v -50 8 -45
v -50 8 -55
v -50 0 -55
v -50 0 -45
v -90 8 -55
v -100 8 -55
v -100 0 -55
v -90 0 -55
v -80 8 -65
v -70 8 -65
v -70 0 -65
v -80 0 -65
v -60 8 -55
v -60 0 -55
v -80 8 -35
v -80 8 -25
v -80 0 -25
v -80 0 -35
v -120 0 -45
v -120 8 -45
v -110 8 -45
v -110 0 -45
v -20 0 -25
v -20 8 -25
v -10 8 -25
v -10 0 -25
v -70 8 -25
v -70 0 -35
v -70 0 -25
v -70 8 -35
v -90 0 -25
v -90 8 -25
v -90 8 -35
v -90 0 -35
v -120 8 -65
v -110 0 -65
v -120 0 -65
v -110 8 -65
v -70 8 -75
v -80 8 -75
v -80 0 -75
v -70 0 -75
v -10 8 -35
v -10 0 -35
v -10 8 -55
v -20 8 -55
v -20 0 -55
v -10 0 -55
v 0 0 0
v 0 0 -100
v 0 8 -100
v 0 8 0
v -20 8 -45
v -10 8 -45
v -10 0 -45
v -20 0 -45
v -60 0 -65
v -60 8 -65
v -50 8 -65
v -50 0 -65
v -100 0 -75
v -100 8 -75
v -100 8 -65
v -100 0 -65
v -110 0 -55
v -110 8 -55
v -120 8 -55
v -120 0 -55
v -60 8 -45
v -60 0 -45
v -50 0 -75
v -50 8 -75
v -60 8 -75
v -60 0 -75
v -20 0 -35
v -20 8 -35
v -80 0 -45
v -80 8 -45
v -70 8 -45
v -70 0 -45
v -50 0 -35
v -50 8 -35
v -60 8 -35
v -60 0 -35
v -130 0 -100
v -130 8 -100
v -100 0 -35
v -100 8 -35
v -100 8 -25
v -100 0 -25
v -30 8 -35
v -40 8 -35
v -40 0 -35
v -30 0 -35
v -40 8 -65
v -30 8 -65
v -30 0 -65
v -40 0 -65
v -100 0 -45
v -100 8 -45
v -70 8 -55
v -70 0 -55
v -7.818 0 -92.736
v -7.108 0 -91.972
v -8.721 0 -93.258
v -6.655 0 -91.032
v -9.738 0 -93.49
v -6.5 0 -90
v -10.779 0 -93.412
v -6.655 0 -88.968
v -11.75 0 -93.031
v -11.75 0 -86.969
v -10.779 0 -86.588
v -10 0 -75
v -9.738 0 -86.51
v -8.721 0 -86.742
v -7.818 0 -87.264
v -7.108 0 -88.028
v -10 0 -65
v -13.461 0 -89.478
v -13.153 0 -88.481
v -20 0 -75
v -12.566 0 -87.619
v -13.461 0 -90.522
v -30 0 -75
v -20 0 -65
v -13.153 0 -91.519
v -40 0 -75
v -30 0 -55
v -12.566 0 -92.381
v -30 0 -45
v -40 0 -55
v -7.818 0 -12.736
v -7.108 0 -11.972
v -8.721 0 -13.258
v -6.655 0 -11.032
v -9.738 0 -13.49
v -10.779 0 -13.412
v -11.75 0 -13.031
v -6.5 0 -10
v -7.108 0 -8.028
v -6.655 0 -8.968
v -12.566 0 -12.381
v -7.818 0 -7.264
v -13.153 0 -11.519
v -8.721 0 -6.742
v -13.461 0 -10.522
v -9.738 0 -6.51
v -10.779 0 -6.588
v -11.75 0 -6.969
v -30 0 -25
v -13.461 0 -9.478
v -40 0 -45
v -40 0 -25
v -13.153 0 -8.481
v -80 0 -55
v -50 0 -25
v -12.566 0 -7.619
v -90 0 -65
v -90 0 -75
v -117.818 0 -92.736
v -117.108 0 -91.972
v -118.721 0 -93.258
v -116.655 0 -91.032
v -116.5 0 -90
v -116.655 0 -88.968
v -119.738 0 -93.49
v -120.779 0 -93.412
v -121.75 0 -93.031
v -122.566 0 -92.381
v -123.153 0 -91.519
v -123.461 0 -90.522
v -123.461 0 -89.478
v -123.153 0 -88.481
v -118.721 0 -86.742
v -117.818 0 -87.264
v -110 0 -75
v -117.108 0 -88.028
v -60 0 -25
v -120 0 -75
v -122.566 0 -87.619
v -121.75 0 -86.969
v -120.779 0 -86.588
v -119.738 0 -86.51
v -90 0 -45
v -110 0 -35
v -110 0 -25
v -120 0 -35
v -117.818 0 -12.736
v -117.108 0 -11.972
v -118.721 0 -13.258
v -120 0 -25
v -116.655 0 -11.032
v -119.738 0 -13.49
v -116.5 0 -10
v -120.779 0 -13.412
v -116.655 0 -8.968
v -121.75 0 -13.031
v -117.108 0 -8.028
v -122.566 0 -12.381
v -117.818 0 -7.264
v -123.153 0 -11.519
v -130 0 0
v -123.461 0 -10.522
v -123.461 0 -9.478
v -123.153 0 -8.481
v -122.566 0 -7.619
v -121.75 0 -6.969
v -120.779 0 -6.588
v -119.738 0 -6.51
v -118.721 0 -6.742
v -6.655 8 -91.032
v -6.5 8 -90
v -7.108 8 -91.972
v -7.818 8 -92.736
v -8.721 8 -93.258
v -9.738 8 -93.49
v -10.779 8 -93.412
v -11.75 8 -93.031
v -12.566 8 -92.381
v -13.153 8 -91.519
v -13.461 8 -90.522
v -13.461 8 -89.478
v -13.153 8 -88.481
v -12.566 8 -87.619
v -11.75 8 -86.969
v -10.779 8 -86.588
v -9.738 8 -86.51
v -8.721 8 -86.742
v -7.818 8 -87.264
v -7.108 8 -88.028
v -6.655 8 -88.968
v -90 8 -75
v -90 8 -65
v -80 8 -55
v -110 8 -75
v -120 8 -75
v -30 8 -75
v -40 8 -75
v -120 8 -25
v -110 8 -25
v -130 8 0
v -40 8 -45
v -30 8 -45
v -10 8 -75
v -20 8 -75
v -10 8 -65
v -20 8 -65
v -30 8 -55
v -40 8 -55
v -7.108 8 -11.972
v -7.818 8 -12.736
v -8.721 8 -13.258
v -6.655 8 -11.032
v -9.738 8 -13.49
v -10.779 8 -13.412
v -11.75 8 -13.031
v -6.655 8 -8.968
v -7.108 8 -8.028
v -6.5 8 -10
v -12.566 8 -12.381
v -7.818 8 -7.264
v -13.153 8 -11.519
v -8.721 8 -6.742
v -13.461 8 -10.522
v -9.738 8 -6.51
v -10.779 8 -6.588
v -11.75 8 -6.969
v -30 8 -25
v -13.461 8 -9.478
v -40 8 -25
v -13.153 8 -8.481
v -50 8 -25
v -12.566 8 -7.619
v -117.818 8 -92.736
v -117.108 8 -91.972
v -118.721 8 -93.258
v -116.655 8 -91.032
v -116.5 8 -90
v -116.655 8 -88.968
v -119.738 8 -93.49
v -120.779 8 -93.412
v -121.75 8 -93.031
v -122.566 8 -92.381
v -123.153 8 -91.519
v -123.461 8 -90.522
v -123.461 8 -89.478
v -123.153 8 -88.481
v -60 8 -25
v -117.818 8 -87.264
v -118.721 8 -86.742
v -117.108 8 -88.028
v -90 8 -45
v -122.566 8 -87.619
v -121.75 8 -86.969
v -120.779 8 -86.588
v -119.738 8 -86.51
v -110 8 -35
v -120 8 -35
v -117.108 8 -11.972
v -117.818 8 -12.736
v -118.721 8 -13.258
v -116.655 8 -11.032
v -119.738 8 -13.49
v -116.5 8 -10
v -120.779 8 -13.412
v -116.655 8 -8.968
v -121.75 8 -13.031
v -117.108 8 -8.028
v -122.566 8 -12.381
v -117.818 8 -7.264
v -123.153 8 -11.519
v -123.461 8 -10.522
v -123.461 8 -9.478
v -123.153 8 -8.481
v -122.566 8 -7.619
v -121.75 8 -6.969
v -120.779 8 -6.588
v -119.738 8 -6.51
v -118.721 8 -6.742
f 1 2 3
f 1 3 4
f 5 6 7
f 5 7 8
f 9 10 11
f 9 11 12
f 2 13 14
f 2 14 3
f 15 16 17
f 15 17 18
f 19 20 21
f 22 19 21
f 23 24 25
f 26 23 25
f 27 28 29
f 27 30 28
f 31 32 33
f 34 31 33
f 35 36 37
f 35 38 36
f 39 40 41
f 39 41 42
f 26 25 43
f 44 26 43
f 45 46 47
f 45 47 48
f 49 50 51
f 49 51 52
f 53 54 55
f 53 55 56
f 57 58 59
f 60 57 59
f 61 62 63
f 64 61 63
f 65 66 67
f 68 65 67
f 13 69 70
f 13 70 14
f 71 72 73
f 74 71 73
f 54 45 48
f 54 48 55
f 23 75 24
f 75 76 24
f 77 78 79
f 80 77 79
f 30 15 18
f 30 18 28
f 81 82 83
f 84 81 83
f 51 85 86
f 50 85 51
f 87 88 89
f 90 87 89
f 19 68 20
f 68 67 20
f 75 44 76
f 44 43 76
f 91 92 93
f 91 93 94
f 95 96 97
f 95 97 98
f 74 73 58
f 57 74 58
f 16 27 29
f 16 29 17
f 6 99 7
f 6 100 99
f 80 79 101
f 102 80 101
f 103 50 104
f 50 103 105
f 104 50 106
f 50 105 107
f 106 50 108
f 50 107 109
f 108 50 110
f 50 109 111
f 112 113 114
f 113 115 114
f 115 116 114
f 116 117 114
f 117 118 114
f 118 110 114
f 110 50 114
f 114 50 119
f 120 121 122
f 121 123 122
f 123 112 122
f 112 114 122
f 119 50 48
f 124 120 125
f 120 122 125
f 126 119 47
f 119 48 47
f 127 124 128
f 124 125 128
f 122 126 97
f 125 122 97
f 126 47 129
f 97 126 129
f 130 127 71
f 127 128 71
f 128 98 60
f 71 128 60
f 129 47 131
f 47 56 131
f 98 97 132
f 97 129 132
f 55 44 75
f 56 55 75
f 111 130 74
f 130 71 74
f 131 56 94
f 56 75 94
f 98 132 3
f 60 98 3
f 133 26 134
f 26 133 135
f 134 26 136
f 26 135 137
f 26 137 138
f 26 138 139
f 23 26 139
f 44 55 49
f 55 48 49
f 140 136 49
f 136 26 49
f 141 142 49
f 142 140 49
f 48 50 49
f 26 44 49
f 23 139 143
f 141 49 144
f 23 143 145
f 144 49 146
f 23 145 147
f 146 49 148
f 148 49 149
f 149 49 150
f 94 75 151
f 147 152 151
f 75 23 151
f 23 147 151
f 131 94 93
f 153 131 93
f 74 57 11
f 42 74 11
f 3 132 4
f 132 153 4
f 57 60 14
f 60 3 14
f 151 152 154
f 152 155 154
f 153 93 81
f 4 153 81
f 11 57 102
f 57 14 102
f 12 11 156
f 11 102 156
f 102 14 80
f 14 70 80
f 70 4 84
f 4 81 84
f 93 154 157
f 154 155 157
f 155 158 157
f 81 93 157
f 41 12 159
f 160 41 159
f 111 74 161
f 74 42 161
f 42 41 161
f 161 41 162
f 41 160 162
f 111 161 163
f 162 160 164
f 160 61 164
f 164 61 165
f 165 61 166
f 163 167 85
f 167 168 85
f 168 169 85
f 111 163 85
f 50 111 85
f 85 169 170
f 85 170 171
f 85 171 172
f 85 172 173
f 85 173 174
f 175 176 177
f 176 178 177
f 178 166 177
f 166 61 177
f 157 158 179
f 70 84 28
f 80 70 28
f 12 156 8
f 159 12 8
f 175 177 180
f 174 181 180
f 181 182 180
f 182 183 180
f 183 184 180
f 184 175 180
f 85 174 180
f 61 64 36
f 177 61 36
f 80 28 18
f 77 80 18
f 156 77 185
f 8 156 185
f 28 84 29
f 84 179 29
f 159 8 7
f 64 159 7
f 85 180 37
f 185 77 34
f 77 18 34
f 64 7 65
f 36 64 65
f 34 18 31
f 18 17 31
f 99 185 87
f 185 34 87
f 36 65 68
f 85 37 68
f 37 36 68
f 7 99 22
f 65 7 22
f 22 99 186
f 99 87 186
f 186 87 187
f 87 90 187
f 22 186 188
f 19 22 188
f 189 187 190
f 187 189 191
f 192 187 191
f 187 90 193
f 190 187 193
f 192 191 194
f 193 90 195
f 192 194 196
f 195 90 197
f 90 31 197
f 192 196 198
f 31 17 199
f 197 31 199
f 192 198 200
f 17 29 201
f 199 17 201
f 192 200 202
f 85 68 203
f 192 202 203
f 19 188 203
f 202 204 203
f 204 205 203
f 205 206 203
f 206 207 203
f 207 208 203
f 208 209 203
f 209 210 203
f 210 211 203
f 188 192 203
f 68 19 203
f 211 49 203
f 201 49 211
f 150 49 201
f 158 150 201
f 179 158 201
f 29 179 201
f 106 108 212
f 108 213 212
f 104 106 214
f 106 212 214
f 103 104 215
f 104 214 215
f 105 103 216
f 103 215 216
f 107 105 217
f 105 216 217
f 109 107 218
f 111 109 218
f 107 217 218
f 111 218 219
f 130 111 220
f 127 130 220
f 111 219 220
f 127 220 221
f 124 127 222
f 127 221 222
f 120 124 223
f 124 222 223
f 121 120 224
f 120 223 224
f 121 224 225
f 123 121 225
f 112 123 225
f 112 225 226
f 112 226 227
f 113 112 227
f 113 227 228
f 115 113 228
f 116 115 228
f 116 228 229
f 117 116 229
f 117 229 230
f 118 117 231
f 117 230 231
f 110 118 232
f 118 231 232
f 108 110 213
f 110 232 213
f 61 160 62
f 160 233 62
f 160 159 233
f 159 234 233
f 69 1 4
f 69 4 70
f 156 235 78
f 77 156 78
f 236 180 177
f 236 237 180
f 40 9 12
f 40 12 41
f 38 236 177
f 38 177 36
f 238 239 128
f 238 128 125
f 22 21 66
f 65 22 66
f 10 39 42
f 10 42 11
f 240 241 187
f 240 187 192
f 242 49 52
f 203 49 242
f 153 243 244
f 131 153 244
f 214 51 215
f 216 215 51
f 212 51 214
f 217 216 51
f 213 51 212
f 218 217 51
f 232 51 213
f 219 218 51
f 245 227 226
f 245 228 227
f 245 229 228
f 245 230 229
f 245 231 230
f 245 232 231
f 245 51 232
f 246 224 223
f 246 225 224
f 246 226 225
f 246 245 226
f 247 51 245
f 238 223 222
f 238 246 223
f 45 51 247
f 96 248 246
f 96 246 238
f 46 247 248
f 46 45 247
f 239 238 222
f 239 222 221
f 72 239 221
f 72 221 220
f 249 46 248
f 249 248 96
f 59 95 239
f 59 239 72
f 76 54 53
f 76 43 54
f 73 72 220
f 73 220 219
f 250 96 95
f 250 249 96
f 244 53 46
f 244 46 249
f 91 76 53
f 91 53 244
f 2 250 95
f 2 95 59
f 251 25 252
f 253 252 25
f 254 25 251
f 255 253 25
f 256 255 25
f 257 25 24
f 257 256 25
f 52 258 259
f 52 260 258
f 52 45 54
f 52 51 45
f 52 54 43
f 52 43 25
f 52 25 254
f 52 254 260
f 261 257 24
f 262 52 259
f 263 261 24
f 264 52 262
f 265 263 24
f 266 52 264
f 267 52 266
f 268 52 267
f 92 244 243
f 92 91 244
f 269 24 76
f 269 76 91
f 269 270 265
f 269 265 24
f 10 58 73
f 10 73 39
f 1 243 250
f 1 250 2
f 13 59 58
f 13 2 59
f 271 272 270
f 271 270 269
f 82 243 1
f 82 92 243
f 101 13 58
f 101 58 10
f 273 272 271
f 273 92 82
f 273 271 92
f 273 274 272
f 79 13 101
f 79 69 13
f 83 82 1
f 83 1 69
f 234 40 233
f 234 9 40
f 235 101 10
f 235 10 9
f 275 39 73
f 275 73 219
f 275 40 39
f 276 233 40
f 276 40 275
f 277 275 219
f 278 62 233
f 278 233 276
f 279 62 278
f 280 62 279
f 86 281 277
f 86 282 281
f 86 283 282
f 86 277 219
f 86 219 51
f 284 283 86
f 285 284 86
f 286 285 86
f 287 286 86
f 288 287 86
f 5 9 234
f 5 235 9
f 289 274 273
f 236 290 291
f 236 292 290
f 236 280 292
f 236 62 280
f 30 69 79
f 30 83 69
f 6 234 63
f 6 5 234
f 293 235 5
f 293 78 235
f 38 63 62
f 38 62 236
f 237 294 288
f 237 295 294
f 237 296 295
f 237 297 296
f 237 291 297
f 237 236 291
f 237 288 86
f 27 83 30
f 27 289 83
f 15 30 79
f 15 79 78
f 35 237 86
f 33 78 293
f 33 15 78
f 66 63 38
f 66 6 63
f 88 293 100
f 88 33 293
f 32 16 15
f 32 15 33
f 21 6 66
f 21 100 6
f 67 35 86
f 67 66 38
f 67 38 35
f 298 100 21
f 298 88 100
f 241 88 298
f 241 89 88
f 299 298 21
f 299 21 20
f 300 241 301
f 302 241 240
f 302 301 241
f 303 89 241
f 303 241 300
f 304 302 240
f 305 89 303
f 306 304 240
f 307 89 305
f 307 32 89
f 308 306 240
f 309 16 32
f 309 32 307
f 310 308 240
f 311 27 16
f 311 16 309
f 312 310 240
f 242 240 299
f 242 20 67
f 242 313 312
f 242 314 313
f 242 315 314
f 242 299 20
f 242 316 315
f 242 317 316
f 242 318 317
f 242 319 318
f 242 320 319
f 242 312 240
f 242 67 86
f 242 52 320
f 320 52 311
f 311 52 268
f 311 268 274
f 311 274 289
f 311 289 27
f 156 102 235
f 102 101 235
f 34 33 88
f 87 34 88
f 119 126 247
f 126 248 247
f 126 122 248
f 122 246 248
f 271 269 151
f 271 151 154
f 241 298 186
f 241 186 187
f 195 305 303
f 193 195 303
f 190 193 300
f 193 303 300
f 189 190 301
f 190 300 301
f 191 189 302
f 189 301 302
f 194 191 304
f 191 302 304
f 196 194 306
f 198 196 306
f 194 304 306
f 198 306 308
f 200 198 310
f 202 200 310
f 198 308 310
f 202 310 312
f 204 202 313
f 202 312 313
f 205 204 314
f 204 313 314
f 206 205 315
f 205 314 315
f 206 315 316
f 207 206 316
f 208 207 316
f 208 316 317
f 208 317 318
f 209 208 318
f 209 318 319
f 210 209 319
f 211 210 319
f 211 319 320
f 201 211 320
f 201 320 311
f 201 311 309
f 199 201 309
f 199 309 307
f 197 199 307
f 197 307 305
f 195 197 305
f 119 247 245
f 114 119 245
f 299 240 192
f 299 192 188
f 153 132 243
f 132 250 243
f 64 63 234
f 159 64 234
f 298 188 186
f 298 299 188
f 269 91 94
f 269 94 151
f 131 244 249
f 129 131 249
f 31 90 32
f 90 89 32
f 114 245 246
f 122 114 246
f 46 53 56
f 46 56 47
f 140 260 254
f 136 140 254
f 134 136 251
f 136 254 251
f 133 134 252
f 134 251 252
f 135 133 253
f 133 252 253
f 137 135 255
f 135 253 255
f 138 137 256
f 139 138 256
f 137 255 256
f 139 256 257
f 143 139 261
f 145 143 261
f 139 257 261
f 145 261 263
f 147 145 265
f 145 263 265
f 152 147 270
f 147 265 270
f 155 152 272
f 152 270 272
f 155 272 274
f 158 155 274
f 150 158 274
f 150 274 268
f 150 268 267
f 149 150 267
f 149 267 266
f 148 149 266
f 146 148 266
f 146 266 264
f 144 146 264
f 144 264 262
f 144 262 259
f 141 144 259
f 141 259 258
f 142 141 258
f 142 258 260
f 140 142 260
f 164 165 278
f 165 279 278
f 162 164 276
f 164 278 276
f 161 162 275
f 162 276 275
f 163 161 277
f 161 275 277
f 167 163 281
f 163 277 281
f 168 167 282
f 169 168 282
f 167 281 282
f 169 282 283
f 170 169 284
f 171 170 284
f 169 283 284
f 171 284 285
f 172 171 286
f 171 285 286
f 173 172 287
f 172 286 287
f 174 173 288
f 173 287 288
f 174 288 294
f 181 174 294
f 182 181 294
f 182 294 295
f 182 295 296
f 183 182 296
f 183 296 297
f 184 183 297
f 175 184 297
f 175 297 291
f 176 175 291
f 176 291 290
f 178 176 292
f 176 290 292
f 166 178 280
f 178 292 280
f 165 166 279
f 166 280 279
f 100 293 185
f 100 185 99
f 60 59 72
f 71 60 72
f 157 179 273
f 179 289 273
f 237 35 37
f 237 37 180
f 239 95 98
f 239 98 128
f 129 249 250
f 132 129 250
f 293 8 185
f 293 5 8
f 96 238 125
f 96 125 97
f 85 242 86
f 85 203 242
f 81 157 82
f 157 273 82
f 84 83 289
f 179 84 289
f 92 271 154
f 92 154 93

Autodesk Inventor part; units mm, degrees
ref_plane "YZ Plane" through (0, 0, 0) normal (1, 0, 0) x (0, 1, 0)
ref_plane "XZ Plane" through (0, 0, 0) normal (0, 1, 0) x (-1, 0, 0)
ref_plane "XY Plane" through (0, 0, 0) normal (0, 0, 1) x (1, 0, 0)
sketch "Sketch1" plane through (0, 0, 0) normal (0, 1, 0) x (-1, 0, 0)
  line L0 (0, 0) -> (130, 0)
  line L1 (130, 0) -> (130, -100)
  line L2 (130, -100) -> (0, -100)
  line L3 (0, -100) -> (0, 0)
  dimension "d0" = 130
  dimension "d1" = 100
extrude "Extrusion1" add sketch "Sketch1" along normal blind 8
sketch "Sketch3" plane through (0, 8, 0) normal (0, 1, 0) x (1, 0, 0)
  line L0 (-120, 5) -> (-110, 5)
  line L1 (-110, 5) -> (-110, 15)
  line L2 (-110, 15) -> (-120, 15)
  line L3 (-120, 15) -> (-120, 5)
  line L4 (-130, 100) -> (-130, 0) projected
  line L5 (-130, 0) -> (0, 0) projected
  line L6 (-105, 0) -> (-105, 100)
  line L7 (0, 100) -> (-130, 100) projected
  line L8 (-130, 20) -> (-105, 20)
  line L9 (-120, 35) -> (-110, 35)
  line L10 (-110, 35) -> (-110, 25)
  line L11 (-110, 25) -> (-120, 25)
  line L12 (-120, 25) -> (-120, 35)
  line L13 (-130, 40) -> (-105, 40)
  line L14 (-120, 75) -> (-110, 75)
  line L15 (-110, 75) -> (-110, 65)
  line L16 (-110, 65) -> (-120, 65)
  line L17 (-120, 65) -> (-120, 75)
  line L18 (-120, 45) -> (-110, 45)
  line L19 (-110, 45) -> (-110, 55)
  line L20 (-110, 55) -> (-120, 55)
  line L21 (-120, 55) -> (-120, 45)
  line L22 (-130, 80) -> (-105, 80)
  line L23 (-120, 155) -> (-110, 155)
  line L24 (-110, 155) -> (-110, 145)
  line L25 (-110, 145) -> (-120, 145)
  line L26 (-120, 145) -> (-120, 155)
  line L27 (-130, 100) -> (0, 100)
  line L28 (-120, 125) -> (-110, 125)
  line L29 (-110, 125) -> (-110, 135)
  line L30 (-110, 135) -> (-120, 135)
  line L31 (-120, 135) -> (-120, 125)
  line L32 (-110, 95) -> (-120, 95)
  line L33 (-120, 95) -> (-120, 85)
  line L34 (-110, 105) -> (-120, 105)
  line L35 (-120, 85) -> (-110, 85)
  line L36 (-110, 85) -> (-110, 95)
  line L37 (-120, 105) -> (-120, 115)
  line L38 (-120, 115) -> (-110, 115)
  line L39 (-110, 115) -> (-110, 105)
  line L40 (-90, 5) -> (-100, 5)
  line L41 (-100, 5) -> (-100, 15)
  line L42 (-100, 15) -> (-90, 15)
  line L43 (-90, 15) -> (-90, 5)
  line L44 (-90, 35) -> (-100, 35)
  line L45 (-100, 35) -> (-100, 25)
  line L46 (-100, 25) -> (-90, 25)
  line L47 (-90, 25) -> (-90, 35)
  line L48 (-100, 65) -> (-90, 65)
  line L49 (-90, 65) -> (-90, 75)
  line L50 (-100, 55) -> (-90, 55)
  line L51 (-90, 75) -> (-100, 75)
  line L52 (-100, 75) -> (-100, 65)
  line L53 (-90, 55) -> (-90, 45)
  line L54 (-90, 45) -> (-100, 45)
  line L55 (-100, 45) -> (-100, 55)
  line L56 (-100, 105) -> (-90, 105)
  line L57 (-90, 105) -> (-90, 115)
  line L58 (-100, 115) -> (-100, 105)
  line L59 (-90, 115) -> (-100, 115)
  line L60 (-90, 125) -> (-100, 125)
  line L61 (-100, 125) -> (-100, 135)
  line L62 (-100, 135) -> (-90, 135)
  line L63 (-90, 135) -> (-90, 125)
  line L64 (-90, 155) -> (-100, 155)
  line L65 (-100, 155) -> (-100, 145)
  line L66 (-100, 145) -> (-90, 145)
  line L67 (-90, 145) -> (-90, 155)
  line L68 (-90, 95) -> (-90, 85)
  line L69 (-90, 85) -> (-100, 85)
  line L70 (-100, 85) -> (-100, 95)
  line L71 (-100, 95) -> (-90, 95)
  line L72 (-85, 0) -> (-85, 100)
  line L73 (-50, 5) -> (-60, 5)
  line L74 (-60, 5) -> (-60, 15)
  line L75 (-60, 15) -> (-50, 15)
  line L76 (-50, 15) -> (-50, 5)
  line L77 (-50, 35) -> (-60, 35)
  line L78 (-60, 35) -> (-60, 25)
  line L79 (-60, 25) -> (-50, 25)
  line L80 (-50, 25) -> (-50, 35)
  line L81 (-60, 65) -> (-50, 65)
  line L82 (-50, 65) -> (-50, 75)
  line L83 (-60, 55) -> (-50, 55)
  line L84 (-50, 75) -> (-60, 75)
  line L85 (-60, 75) -> (-60, 65)
  line L86 (-50, 55) -> (-50, 45)
  line L87 (-50, 45) -> (-60, 45)
  line L88 (-60, 45) -> (-60, 55)
  line L89 (-60, 105) -> (-50, 105)
  line L90 (-50, 105) -> (-50, 115)
  line L91 (-60, 115) -> (-60, 105)
  line L92 (-50, 115) -> (-60, 115)
  line L93 (-50, 125) -> (-60, 125)
  line L94 (-60, 125) -> (-60, 135)
  line L95 (-60, 135) -> (-50, 135)
  line L96 (-50, 135) -> (-50, 125)
  line L97 (-50, 155) -> (-60, 155)
  line L98 (-60, 155) -> (-60, 145)
  line L99 (-60, 145) -> (-50, 145)
  line L100 (-50, 145) -> (-50, 155)
  line L101 (-50, 95) -> (-50, 85)
  line L102 (-50, 85) -> (-60, 85)
  line L103 (-60, 85) -> (-60, 95)
  line L104 (-60, 95) -> (-50, 95)
  line L105 (-80, 125) -> (-70, 125)
  line L106 (-70, 125) -> (-70, 135)
  line L107 (-80, 135) -> (-80, 125)
  line L108 (-70, 135) -> (-80, 135)
  line L109 (-70, 145) -> (-80, 145)
  line L110 (-80, 155) -> (-70, 155)
  line L111 (-80, 145) -> (-80, 155)
  line L112 (-70, 155) -> (-70, 145)
  line L113 (-70, 15) -> (-80, 15)
  line L114 (-80, 15) -> (-80, 5)
  line L115 (-80, 5) -> (-70, 5)
  line L116 (-70, 5) -> (-70, 15)
  line L117 (-80, 45) -> (-70, 45)
  line L118 (-80, 35) -> (-70, 35)
  line L119 (-70, 25) -> (-80, 25)
  line L120 (-80, 25) -> (-80, 35)
  line L121 (-70, 35) -> (-70, 25)
  line L122 (-70, 45) -> (-70, 55)
  line L123 (-80, 55) -> (-80, 45)
  line L124 (-70, 65) -> (-80, 65)
  line L125 (-70, 75) -> (-70, 65)
  line L126 (-80, 65) -> (-80, 75)
  line L127 (-80, 75) -> (-70, 75)
  line L128 (-70, 55) -> (-80, 55)
  line L129 (-80, 85) -> (-70, 85)
  line L130 (-70, 85) -> (-70, 95)
  line L131 (-80, 95) -> (-80, 85)
  line L132 (-70, 95) -> (-80, 95)
  line L133 (-70, 105) -> (-80, 105)
  line L134 (-80, 115) -> (-70, 115)
  line L135 (-80, 105) -> (-80, 115)
  line L136 (-70, 115) -> (-70, 105)
  line L137 (-45, 0) -> (-45, 100)
  line L138 (-10, 125) -> (-20, 125)
  line L139 (-20, 125) -> (-20, 135)
  line L140 (-10, 135) -> (-10, 125)
  line L141 (-20, 135) -> (-10, 135)
  line L142 (-20, 145) -> (-10, 145)
  line L143 (-20, 155) -> (-20, 145)
  line L144 (-10, 155) -> (-20, 155)
  line L145 (-10, 145) -> (-10, 155)
  line L146 (-40, 5) -> (-30, 5)
  line L147 (-30, 5) -> (-30, 15)
  line L148 (-30, 15) -> (-40, 15)
  line L149 (-40, 15) -> (-40, 5)
  line L150 (-40, 65) -> (-40, 75)
  line L151 (-40, 35) -> (-30, 35)
  line L152 (-30, 35) -> (-30, 25)
  line L153 (-30, 25) -> (-40, 25)
  line L154 (-40, 25) -> (-40, 35)
  line L155 (-30, 65) -> (-40, 65)
  line L156 (-40, 75) -> (-30, 75)
  line L157 (-30, 75) -> (-30, 65)
  line L158 (-30, 55) -> (-40, 55)
  line L159 (-40, 55) -> (-40, 45)
  line L160 (-40, 45) -> (-30, 45)
  line L161 (-30, 45) -> (-30, 55)
  line L162 (-30, 125) -> (-30, 135)
  line L163 (-30, 155) -> (-30, 145)
  line L164 (-40, 125) -> (-30, 125)
  line L165 (-40, 135) -> (-40, 125)
  line L166 (-30, 135) -> (-40, 135)
  line L167 (-30, 145) -> (-40, 145)
  line L168 (-40, 145) -> (-40, 155)
  line L169 (-40, 155) -> (-30, 155)
  line L170 (-30, 105) -> (-40, 105)
  line L171 (-40, 105) -> (-40, 115)
  line L172 (-30, 115) -> (-30, 105)
  line L173 (-40, 115) -> (-30, 115)
  line L174 (-40, 95) -> (-40, 85)
  line L175 (-40, 85) -> (-30, 85)
  line L176 (-30, 85) -> (-30, 95)
  line L177 (-30, 95) -> (-40, 95)
  line L178 (-10, 115) -> (-20, 115)
  line L179 (-20, 115) -> (-20, 105)
  line L180 (-10, 105) -> (-10, 115)
  line L181 (-20, 105) -> (-10, 105)
  line L182 (-20, 95) -> (-10, 95)
  line L183 (-20, 85) -> (-20, 95)
  line L184 (-10, 85) -> (-20, 85)
  line L185 (-10, 95) -> (-10, 85)
  line L186 (-10, 75) -> (-20, 75)
  line L187 (-10, 65) -> (-10, 75)
  line L188 (-20, 65) -> (-10, 65)
  line L189 (-20, 75) -> (-20, 65)
  line L190 (-20, 15) -> (-10, 15)
  line L191 (-10, 15) -> (-10, 5)
  line L192 (-20, 5) -> (-20, 15)
  line L193 (-10, 5) -> (-20, 5)
  line L194 (-10, 45) -> (-20, 45)
  line L195 (-10, 35) -> (-20, 35)
  line L196 (-10, 25) -> (-10, 35)
  line L197 (-20, 25) -> (-10, 25)
  line L198 (-20, 55) -> (-10, 55)
  line L199 (-20, 45) -> (-20, 55)
  line L200 (-20, 35) -> (-20, 25)
  line L201 (-10, 55) -> (-10, 45)
  point P0 (-65, 20)
  point P1 (-65, 40)
  point P2 (-65, 80)
  point P3 (-25, 20)
  point P4 (-25, 40)
  point P5 (-25, 80)
  dimension "d21" = 10
  dimension "d22" = 10
  dimension "d23" = 10
  dimension "d24" = 5
  dimension "d25" = 5
  dimension "d26" = 5
  dimension "d27" = 5
  dimension "d28" = 5
  dimension "d29" = 5
  dimension "d30" = 5
  dimension "d40" = 5
sketch "Sketch4" plane through (0, 8, 0) normal (0, 1, 0) x (1, 0, 0)
  circle A0 centre (-120, 10) radius 3.5
  line L0 (-130, 0) -> (0, 0) projected
  line L1 (-130, 100) -> (-130, 0) projected
  line L2 (-65, 0) -> (-65, 170)
  line L3 (-130, 100) -> (-130, 0) projected
  line L4 (-130, 50) -> (0, 50)
  circle A1 centre (-10, 10) radius 3.5
  circle A2 centre (-120, 90) radius 3.5
  line L5 (-130, 100) -> (0, 100)
  circle A3 centre (-10, 90) radius 3.5
  point P0 (0, 100)
  dimension "d35" = 7
  dimension "d36" = 10
  dimension "d37" = 10
extrude "Extrusion5" cut sketch "Sketch4" against normal blind 20 contours A0 | A1 | A2 | A3
extrude "Extrusion6" cut sketch "Sketch3" against normal blind 20 contours L9 L10 L11 L12 | L14 L15 L16 L17 | L21 L20 L19 L18 | L47 L46 L45 L44 | L52 L51 L49 L48 | L50 L53 L54 L55 | L80 L79 L78 L77 | L85 L84 L82 L81 | L83 L86 L87 L88 | L123 L128 L122 L117 | L118 L121 L119 L120 | L124 L126 L127 L125 | L150 L156 L157 L155 | L151 L152 L153 L154 | L161 L160 L159 L158 | L187 L188 L189 L186 | L194 L199 L198 L201 | L196 L197 L200 L195
properties part number "floor_plan"
